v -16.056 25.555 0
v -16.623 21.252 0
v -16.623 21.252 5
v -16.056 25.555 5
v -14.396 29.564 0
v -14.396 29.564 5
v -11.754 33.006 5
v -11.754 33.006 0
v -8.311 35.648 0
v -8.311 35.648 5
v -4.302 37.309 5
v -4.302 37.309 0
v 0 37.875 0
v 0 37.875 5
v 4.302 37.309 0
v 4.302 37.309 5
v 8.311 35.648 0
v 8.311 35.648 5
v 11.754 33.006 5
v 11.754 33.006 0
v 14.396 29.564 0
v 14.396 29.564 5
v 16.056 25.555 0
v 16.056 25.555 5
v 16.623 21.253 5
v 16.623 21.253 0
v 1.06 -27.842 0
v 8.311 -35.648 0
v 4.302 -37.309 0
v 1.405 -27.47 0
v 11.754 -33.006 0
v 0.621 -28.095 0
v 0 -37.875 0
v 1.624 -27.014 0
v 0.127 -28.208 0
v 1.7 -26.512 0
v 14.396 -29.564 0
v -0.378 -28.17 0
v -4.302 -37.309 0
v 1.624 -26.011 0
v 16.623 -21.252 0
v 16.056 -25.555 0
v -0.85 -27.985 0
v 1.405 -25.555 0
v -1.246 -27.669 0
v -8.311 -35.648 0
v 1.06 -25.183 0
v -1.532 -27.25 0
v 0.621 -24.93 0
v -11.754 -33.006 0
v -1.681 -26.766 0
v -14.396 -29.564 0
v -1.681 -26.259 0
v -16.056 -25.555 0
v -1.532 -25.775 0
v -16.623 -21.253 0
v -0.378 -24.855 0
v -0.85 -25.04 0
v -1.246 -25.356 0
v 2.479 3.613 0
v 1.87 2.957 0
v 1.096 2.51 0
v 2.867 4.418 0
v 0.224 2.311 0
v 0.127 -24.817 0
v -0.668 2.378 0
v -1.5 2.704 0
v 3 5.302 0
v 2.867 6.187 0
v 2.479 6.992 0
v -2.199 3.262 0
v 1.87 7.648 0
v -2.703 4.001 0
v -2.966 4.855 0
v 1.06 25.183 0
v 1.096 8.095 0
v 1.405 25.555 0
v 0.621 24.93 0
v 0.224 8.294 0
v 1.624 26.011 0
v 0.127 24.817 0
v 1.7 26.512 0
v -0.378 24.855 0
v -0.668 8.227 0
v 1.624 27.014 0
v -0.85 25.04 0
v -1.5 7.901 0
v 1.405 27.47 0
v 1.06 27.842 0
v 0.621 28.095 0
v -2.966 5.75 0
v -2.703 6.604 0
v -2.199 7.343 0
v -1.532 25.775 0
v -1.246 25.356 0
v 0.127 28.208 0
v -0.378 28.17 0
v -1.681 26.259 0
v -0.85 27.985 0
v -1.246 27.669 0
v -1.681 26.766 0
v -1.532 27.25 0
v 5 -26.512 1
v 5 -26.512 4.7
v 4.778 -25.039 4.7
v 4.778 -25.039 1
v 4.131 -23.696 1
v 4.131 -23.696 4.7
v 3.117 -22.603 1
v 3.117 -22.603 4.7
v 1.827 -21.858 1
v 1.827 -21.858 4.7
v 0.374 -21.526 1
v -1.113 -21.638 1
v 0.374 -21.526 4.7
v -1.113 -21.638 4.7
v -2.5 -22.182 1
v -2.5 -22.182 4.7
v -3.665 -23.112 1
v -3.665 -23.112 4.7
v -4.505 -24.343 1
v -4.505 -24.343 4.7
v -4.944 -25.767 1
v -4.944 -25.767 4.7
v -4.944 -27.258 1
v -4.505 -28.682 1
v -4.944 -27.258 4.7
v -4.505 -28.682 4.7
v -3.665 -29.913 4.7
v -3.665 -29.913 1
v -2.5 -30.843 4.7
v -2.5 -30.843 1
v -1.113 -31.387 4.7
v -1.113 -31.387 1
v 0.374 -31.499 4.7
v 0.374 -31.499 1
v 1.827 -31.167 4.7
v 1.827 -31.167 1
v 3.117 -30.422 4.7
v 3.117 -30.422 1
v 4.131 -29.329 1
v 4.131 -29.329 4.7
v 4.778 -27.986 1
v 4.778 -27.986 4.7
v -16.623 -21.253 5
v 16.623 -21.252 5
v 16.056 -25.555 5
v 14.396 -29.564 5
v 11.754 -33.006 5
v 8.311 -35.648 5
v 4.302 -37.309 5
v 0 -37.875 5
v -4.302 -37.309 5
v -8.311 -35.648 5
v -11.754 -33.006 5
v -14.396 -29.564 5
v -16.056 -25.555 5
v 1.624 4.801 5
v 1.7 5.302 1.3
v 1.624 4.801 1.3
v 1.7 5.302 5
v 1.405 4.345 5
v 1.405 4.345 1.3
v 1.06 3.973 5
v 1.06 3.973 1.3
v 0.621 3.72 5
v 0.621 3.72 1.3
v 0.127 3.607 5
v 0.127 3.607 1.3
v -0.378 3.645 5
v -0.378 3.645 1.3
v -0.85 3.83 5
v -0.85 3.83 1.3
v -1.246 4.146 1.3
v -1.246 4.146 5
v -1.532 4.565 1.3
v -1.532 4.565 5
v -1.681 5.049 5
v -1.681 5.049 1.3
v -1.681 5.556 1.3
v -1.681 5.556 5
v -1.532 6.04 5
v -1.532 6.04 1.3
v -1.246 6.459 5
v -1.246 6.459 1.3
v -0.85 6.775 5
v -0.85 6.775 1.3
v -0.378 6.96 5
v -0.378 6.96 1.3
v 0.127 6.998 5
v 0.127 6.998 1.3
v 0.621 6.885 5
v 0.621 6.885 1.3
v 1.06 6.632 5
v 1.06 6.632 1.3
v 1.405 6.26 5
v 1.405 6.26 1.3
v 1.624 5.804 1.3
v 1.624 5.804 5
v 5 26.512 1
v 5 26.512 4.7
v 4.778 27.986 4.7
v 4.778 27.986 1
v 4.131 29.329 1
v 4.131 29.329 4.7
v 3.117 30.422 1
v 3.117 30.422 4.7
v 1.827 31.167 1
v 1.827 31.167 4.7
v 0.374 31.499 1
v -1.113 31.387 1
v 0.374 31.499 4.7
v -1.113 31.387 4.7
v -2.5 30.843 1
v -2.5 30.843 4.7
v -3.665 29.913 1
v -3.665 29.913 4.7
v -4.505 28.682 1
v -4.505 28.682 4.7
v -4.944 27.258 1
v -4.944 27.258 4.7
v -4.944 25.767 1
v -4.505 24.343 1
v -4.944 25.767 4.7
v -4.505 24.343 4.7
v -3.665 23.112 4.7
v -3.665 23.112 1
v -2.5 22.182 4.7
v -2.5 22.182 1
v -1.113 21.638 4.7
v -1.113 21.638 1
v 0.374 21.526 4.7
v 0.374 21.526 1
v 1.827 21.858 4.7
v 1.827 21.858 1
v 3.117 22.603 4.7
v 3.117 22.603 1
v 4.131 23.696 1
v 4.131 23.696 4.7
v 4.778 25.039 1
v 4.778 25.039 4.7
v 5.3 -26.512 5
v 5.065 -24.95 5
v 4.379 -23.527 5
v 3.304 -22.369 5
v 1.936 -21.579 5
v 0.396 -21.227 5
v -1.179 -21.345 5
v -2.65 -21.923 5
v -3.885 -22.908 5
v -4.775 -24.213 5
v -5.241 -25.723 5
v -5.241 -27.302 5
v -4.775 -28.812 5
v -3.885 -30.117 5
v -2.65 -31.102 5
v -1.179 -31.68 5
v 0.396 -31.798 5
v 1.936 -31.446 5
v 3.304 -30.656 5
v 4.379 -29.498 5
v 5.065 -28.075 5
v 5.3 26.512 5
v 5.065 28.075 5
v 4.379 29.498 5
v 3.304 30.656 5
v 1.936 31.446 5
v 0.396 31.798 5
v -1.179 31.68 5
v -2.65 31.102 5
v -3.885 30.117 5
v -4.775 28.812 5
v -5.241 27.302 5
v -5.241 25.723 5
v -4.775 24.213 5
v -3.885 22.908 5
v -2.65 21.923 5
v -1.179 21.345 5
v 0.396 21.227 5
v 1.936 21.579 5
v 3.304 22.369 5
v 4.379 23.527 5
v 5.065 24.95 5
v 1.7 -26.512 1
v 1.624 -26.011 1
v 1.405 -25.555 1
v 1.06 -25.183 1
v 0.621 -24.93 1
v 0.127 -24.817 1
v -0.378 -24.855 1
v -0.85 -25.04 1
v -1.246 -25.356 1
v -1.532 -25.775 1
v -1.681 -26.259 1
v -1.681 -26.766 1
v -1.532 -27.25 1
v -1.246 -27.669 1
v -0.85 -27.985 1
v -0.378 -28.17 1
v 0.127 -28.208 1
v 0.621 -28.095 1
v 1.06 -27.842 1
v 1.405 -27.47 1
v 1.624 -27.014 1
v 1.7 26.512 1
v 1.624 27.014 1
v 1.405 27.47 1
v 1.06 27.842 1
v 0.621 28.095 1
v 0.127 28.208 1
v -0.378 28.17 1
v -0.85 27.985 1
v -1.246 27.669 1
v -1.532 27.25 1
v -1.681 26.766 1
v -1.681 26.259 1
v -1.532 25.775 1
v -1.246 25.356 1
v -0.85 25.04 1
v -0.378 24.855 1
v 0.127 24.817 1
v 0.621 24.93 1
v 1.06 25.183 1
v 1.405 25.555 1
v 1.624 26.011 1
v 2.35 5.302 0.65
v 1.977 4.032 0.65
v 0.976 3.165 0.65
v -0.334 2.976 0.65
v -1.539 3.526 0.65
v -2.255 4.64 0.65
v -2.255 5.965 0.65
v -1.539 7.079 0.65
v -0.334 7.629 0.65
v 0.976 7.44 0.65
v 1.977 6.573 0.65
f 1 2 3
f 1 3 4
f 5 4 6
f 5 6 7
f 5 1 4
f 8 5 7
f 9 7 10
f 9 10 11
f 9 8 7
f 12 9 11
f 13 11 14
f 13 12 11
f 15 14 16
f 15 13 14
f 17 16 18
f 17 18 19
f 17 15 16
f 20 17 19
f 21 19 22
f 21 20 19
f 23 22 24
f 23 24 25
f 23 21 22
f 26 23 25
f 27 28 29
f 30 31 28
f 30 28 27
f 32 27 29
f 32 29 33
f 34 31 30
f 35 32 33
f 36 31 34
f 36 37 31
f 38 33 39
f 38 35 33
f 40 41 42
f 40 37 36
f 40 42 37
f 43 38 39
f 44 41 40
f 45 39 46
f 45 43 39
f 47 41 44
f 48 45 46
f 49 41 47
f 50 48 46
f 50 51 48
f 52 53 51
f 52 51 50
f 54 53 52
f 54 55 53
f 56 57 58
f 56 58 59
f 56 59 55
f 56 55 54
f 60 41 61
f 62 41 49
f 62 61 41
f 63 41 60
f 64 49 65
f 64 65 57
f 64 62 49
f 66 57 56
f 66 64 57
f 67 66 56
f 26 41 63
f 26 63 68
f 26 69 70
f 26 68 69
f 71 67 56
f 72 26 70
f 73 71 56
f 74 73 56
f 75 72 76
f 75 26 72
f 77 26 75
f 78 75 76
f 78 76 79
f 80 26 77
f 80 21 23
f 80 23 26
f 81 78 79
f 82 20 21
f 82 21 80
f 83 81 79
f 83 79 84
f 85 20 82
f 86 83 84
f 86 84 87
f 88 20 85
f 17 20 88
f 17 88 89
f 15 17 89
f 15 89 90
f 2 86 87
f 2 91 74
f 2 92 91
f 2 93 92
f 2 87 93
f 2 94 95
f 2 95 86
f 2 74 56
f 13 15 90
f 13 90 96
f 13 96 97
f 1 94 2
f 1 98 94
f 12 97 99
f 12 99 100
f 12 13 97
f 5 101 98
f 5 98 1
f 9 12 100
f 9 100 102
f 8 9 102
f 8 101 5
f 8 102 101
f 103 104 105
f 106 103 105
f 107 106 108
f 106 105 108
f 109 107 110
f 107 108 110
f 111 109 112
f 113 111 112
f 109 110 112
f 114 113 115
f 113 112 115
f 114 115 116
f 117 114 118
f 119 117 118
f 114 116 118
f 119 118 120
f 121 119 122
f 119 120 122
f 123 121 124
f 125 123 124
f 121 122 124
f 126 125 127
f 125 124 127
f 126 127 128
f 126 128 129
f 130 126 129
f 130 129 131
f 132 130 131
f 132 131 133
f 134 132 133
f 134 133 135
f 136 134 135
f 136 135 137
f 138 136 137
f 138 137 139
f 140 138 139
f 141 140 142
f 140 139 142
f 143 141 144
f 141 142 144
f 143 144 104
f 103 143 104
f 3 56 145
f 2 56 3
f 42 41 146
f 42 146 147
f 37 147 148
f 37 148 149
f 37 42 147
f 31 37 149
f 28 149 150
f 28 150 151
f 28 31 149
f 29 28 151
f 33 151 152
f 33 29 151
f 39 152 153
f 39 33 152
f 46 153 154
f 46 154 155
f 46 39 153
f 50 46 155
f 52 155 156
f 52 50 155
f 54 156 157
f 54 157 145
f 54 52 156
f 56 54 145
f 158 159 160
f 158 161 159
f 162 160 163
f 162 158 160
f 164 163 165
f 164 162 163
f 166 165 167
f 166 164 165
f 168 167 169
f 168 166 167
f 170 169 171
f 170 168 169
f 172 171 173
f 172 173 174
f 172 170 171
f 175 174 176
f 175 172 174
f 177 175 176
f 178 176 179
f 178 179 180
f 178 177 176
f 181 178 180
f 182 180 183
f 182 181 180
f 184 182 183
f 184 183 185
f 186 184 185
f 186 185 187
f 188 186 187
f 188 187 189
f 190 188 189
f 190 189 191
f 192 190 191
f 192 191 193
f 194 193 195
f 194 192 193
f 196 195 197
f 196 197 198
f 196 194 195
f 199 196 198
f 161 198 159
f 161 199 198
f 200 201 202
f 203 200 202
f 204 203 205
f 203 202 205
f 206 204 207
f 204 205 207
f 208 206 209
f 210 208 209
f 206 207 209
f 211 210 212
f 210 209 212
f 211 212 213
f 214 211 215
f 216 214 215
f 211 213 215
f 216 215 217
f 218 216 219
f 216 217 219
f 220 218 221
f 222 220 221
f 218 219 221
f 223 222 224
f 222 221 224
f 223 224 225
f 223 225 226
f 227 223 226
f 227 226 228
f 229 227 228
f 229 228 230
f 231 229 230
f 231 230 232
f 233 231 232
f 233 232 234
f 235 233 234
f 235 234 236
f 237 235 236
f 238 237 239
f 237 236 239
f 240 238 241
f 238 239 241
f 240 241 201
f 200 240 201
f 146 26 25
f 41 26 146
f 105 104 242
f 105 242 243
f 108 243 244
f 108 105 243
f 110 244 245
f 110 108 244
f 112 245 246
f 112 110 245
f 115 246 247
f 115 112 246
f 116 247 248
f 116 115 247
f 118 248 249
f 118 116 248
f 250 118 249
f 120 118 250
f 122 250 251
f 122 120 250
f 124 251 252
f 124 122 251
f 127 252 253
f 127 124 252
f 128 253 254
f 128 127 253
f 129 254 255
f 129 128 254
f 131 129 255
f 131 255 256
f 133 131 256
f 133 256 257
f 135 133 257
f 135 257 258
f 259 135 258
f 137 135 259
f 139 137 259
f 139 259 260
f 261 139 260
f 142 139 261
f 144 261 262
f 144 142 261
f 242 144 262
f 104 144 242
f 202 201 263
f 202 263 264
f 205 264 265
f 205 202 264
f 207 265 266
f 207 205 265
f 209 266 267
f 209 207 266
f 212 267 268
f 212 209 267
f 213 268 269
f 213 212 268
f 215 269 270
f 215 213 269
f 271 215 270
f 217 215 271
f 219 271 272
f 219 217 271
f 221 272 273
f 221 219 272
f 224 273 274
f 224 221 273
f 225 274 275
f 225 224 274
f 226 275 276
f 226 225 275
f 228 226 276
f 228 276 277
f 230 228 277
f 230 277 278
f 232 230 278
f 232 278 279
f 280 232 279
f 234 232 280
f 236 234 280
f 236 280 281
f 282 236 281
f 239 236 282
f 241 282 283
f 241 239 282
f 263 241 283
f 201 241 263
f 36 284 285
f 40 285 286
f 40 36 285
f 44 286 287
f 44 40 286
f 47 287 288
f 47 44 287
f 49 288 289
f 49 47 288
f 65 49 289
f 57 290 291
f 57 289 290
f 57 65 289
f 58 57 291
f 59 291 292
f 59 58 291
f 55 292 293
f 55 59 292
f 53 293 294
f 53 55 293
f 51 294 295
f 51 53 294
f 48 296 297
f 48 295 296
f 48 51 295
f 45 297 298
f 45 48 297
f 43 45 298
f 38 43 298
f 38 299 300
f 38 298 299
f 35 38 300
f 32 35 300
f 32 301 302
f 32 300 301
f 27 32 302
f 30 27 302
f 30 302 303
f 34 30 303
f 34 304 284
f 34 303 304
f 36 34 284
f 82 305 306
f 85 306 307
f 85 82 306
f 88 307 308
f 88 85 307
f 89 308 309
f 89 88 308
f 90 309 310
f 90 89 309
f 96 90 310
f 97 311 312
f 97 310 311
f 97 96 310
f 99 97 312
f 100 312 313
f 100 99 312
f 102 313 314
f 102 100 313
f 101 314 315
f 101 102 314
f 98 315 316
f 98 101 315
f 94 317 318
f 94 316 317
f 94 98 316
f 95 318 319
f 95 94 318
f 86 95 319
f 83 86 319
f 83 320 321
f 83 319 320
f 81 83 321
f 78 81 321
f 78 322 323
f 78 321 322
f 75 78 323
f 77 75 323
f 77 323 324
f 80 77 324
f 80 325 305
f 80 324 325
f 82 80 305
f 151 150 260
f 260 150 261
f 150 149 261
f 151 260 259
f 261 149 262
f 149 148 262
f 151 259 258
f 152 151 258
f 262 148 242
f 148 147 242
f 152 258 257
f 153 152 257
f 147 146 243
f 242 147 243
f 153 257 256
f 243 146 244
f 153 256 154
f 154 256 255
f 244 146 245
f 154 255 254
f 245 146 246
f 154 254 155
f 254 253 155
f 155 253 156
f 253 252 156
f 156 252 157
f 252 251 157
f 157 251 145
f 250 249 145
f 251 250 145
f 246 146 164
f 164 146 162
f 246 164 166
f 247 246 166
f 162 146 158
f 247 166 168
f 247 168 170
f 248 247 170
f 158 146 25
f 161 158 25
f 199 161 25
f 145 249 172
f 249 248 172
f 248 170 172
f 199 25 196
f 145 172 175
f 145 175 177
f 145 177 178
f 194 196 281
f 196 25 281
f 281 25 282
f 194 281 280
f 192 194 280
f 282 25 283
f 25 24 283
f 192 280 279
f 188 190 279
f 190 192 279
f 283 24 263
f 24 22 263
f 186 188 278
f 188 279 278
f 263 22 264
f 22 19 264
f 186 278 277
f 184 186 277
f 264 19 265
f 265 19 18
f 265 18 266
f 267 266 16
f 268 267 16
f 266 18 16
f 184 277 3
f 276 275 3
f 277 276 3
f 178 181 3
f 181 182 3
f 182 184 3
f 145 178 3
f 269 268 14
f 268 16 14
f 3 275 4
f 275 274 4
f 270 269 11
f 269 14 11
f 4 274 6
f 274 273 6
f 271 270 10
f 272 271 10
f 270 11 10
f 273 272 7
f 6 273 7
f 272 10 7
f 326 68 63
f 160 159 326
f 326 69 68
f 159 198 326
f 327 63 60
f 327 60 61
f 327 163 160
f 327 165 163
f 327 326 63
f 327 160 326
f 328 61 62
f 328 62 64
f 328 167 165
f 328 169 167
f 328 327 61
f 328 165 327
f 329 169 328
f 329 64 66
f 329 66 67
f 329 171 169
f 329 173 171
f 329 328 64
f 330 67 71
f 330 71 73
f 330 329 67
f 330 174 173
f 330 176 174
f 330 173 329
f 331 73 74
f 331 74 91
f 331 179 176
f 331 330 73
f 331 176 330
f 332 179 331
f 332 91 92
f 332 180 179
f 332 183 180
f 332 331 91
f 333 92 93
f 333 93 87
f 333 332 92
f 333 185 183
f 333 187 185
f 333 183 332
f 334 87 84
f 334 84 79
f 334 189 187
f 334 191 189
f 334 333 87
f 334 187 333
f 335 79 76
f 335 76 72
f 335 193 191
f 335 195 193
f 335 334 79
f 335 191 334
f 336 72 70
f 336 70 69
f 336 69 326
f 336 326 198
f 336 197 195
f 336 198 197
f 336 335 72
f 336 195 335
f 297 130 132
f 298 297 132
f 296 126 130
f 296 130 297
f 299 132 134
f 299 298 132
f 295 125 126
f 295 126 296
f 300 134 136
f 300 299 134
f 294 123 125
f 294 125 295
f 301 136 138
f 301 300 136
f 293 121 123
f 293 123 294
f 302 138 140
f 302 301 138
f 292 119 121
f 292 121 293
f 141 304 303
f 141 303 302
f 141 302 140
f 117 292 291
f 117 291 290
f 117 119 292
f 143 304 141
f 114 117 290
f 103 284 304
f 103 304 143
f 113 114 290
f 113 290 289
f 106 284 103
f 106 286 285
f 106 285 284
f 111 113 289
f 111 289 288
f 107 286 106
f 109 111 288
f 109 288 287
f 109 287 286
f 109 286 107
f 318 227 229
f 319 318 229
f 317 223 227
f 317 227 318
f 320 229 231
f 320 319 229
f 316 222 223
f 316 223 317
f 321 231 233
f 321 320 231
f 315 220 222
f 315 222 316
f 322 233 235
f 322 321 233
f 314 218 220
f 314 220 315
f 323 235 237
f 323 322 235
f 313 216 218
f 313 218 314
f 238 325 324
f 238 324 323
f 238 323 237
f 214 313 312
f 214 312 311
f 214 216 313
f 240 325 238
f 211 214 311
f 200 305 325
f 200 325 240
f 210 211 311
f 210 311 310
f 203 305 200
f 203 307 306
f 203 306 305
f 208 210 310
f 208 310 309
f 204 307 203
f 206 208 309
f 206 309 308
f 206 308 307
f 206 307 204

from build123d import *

# Parameters (mm, degrees)
SKETCH1_R           = 1.7
BOSS_EXTRUDE1_DEPTH = 5
SKETCH3_R           = 5
CUT_EXTRUDE1_DEPTH  = 4
CHAMFER1_SIZE       = 0.3


with BuildPart() as part:
    # Sketch1 → Boss-Extrude1 (new body)
    with BuildSketch(Plane.XY):
        with BuildLine():
            Line((-16.6225, -21.2525), (-16.6225, 21.2525))
            ThreePointArc((-16.6225, 21.2525), (0, 37.875), (16.6225, 21.2525))
            Line((16.6225, 21.2525), (16.6225, -21.2525))
            ThreePointArc((16.6225, -21.2525), (0, -37.875), (-16.6225, -21.2525))
        make_face()
        with Locations((0, 26.5125)):
            Circle(SKETCH1_R, mode=Mode.SUBTRACT)
        with Locations((0, -26.5125)):
            Circle(SKETCH1_R, mode=Mode.SUBTRACT)
    extrude(amount=BOSS_EXTRUDE1_DEPTH)

    # Sketch3 → Cut-Extrude1 (cut)
    with BuildSketch(Plane.XY.offset(5)):
        with Locations((0, 26.5125)):
            Circle(SKETCH3_R)
        with Locations((0, -26.5125)):
            Circle(SKETCH3_R)
    extrude(amount=-CUT_EXTRUDE1_DEPTH, mode=Mode.SUBTRACT)

    # Sketch2 → Cut-Revolve1 (revolve, cut)
    with BuildSketch(Plane(origin=(0, 0, 0), x_dir=(0, 0, -1), z_dir=(1, 0, 0)), mode=Mode.PRIVATE) as cut_revolve1_sk:
        Polygon((-5, 5.3025), (0, 5.3025), (0, 2.3025), (-1.3, 3.6025), (-5, 3.6025), align=None)
    revolve(cut_revolve1_sk.sketch.rotate(Axis((0, 5.3025, 13.61294397), (0, 0, -1)), 270), axis=Axis((0, 5.3025, 13.61294397), (0, 0, -1)), mode=Mode.SUBTRACT)

    # Chamfer1
    chamfer1_edges = [part.edges().sort_by_distance(p)[0] for p in [
        (-5, 26.5125, 5),
        (-5, -26.5125, 5),
    ]]
    chamfer(chamfer1_edges, length=CHAMFER1_SIZE)


solid = part.part
